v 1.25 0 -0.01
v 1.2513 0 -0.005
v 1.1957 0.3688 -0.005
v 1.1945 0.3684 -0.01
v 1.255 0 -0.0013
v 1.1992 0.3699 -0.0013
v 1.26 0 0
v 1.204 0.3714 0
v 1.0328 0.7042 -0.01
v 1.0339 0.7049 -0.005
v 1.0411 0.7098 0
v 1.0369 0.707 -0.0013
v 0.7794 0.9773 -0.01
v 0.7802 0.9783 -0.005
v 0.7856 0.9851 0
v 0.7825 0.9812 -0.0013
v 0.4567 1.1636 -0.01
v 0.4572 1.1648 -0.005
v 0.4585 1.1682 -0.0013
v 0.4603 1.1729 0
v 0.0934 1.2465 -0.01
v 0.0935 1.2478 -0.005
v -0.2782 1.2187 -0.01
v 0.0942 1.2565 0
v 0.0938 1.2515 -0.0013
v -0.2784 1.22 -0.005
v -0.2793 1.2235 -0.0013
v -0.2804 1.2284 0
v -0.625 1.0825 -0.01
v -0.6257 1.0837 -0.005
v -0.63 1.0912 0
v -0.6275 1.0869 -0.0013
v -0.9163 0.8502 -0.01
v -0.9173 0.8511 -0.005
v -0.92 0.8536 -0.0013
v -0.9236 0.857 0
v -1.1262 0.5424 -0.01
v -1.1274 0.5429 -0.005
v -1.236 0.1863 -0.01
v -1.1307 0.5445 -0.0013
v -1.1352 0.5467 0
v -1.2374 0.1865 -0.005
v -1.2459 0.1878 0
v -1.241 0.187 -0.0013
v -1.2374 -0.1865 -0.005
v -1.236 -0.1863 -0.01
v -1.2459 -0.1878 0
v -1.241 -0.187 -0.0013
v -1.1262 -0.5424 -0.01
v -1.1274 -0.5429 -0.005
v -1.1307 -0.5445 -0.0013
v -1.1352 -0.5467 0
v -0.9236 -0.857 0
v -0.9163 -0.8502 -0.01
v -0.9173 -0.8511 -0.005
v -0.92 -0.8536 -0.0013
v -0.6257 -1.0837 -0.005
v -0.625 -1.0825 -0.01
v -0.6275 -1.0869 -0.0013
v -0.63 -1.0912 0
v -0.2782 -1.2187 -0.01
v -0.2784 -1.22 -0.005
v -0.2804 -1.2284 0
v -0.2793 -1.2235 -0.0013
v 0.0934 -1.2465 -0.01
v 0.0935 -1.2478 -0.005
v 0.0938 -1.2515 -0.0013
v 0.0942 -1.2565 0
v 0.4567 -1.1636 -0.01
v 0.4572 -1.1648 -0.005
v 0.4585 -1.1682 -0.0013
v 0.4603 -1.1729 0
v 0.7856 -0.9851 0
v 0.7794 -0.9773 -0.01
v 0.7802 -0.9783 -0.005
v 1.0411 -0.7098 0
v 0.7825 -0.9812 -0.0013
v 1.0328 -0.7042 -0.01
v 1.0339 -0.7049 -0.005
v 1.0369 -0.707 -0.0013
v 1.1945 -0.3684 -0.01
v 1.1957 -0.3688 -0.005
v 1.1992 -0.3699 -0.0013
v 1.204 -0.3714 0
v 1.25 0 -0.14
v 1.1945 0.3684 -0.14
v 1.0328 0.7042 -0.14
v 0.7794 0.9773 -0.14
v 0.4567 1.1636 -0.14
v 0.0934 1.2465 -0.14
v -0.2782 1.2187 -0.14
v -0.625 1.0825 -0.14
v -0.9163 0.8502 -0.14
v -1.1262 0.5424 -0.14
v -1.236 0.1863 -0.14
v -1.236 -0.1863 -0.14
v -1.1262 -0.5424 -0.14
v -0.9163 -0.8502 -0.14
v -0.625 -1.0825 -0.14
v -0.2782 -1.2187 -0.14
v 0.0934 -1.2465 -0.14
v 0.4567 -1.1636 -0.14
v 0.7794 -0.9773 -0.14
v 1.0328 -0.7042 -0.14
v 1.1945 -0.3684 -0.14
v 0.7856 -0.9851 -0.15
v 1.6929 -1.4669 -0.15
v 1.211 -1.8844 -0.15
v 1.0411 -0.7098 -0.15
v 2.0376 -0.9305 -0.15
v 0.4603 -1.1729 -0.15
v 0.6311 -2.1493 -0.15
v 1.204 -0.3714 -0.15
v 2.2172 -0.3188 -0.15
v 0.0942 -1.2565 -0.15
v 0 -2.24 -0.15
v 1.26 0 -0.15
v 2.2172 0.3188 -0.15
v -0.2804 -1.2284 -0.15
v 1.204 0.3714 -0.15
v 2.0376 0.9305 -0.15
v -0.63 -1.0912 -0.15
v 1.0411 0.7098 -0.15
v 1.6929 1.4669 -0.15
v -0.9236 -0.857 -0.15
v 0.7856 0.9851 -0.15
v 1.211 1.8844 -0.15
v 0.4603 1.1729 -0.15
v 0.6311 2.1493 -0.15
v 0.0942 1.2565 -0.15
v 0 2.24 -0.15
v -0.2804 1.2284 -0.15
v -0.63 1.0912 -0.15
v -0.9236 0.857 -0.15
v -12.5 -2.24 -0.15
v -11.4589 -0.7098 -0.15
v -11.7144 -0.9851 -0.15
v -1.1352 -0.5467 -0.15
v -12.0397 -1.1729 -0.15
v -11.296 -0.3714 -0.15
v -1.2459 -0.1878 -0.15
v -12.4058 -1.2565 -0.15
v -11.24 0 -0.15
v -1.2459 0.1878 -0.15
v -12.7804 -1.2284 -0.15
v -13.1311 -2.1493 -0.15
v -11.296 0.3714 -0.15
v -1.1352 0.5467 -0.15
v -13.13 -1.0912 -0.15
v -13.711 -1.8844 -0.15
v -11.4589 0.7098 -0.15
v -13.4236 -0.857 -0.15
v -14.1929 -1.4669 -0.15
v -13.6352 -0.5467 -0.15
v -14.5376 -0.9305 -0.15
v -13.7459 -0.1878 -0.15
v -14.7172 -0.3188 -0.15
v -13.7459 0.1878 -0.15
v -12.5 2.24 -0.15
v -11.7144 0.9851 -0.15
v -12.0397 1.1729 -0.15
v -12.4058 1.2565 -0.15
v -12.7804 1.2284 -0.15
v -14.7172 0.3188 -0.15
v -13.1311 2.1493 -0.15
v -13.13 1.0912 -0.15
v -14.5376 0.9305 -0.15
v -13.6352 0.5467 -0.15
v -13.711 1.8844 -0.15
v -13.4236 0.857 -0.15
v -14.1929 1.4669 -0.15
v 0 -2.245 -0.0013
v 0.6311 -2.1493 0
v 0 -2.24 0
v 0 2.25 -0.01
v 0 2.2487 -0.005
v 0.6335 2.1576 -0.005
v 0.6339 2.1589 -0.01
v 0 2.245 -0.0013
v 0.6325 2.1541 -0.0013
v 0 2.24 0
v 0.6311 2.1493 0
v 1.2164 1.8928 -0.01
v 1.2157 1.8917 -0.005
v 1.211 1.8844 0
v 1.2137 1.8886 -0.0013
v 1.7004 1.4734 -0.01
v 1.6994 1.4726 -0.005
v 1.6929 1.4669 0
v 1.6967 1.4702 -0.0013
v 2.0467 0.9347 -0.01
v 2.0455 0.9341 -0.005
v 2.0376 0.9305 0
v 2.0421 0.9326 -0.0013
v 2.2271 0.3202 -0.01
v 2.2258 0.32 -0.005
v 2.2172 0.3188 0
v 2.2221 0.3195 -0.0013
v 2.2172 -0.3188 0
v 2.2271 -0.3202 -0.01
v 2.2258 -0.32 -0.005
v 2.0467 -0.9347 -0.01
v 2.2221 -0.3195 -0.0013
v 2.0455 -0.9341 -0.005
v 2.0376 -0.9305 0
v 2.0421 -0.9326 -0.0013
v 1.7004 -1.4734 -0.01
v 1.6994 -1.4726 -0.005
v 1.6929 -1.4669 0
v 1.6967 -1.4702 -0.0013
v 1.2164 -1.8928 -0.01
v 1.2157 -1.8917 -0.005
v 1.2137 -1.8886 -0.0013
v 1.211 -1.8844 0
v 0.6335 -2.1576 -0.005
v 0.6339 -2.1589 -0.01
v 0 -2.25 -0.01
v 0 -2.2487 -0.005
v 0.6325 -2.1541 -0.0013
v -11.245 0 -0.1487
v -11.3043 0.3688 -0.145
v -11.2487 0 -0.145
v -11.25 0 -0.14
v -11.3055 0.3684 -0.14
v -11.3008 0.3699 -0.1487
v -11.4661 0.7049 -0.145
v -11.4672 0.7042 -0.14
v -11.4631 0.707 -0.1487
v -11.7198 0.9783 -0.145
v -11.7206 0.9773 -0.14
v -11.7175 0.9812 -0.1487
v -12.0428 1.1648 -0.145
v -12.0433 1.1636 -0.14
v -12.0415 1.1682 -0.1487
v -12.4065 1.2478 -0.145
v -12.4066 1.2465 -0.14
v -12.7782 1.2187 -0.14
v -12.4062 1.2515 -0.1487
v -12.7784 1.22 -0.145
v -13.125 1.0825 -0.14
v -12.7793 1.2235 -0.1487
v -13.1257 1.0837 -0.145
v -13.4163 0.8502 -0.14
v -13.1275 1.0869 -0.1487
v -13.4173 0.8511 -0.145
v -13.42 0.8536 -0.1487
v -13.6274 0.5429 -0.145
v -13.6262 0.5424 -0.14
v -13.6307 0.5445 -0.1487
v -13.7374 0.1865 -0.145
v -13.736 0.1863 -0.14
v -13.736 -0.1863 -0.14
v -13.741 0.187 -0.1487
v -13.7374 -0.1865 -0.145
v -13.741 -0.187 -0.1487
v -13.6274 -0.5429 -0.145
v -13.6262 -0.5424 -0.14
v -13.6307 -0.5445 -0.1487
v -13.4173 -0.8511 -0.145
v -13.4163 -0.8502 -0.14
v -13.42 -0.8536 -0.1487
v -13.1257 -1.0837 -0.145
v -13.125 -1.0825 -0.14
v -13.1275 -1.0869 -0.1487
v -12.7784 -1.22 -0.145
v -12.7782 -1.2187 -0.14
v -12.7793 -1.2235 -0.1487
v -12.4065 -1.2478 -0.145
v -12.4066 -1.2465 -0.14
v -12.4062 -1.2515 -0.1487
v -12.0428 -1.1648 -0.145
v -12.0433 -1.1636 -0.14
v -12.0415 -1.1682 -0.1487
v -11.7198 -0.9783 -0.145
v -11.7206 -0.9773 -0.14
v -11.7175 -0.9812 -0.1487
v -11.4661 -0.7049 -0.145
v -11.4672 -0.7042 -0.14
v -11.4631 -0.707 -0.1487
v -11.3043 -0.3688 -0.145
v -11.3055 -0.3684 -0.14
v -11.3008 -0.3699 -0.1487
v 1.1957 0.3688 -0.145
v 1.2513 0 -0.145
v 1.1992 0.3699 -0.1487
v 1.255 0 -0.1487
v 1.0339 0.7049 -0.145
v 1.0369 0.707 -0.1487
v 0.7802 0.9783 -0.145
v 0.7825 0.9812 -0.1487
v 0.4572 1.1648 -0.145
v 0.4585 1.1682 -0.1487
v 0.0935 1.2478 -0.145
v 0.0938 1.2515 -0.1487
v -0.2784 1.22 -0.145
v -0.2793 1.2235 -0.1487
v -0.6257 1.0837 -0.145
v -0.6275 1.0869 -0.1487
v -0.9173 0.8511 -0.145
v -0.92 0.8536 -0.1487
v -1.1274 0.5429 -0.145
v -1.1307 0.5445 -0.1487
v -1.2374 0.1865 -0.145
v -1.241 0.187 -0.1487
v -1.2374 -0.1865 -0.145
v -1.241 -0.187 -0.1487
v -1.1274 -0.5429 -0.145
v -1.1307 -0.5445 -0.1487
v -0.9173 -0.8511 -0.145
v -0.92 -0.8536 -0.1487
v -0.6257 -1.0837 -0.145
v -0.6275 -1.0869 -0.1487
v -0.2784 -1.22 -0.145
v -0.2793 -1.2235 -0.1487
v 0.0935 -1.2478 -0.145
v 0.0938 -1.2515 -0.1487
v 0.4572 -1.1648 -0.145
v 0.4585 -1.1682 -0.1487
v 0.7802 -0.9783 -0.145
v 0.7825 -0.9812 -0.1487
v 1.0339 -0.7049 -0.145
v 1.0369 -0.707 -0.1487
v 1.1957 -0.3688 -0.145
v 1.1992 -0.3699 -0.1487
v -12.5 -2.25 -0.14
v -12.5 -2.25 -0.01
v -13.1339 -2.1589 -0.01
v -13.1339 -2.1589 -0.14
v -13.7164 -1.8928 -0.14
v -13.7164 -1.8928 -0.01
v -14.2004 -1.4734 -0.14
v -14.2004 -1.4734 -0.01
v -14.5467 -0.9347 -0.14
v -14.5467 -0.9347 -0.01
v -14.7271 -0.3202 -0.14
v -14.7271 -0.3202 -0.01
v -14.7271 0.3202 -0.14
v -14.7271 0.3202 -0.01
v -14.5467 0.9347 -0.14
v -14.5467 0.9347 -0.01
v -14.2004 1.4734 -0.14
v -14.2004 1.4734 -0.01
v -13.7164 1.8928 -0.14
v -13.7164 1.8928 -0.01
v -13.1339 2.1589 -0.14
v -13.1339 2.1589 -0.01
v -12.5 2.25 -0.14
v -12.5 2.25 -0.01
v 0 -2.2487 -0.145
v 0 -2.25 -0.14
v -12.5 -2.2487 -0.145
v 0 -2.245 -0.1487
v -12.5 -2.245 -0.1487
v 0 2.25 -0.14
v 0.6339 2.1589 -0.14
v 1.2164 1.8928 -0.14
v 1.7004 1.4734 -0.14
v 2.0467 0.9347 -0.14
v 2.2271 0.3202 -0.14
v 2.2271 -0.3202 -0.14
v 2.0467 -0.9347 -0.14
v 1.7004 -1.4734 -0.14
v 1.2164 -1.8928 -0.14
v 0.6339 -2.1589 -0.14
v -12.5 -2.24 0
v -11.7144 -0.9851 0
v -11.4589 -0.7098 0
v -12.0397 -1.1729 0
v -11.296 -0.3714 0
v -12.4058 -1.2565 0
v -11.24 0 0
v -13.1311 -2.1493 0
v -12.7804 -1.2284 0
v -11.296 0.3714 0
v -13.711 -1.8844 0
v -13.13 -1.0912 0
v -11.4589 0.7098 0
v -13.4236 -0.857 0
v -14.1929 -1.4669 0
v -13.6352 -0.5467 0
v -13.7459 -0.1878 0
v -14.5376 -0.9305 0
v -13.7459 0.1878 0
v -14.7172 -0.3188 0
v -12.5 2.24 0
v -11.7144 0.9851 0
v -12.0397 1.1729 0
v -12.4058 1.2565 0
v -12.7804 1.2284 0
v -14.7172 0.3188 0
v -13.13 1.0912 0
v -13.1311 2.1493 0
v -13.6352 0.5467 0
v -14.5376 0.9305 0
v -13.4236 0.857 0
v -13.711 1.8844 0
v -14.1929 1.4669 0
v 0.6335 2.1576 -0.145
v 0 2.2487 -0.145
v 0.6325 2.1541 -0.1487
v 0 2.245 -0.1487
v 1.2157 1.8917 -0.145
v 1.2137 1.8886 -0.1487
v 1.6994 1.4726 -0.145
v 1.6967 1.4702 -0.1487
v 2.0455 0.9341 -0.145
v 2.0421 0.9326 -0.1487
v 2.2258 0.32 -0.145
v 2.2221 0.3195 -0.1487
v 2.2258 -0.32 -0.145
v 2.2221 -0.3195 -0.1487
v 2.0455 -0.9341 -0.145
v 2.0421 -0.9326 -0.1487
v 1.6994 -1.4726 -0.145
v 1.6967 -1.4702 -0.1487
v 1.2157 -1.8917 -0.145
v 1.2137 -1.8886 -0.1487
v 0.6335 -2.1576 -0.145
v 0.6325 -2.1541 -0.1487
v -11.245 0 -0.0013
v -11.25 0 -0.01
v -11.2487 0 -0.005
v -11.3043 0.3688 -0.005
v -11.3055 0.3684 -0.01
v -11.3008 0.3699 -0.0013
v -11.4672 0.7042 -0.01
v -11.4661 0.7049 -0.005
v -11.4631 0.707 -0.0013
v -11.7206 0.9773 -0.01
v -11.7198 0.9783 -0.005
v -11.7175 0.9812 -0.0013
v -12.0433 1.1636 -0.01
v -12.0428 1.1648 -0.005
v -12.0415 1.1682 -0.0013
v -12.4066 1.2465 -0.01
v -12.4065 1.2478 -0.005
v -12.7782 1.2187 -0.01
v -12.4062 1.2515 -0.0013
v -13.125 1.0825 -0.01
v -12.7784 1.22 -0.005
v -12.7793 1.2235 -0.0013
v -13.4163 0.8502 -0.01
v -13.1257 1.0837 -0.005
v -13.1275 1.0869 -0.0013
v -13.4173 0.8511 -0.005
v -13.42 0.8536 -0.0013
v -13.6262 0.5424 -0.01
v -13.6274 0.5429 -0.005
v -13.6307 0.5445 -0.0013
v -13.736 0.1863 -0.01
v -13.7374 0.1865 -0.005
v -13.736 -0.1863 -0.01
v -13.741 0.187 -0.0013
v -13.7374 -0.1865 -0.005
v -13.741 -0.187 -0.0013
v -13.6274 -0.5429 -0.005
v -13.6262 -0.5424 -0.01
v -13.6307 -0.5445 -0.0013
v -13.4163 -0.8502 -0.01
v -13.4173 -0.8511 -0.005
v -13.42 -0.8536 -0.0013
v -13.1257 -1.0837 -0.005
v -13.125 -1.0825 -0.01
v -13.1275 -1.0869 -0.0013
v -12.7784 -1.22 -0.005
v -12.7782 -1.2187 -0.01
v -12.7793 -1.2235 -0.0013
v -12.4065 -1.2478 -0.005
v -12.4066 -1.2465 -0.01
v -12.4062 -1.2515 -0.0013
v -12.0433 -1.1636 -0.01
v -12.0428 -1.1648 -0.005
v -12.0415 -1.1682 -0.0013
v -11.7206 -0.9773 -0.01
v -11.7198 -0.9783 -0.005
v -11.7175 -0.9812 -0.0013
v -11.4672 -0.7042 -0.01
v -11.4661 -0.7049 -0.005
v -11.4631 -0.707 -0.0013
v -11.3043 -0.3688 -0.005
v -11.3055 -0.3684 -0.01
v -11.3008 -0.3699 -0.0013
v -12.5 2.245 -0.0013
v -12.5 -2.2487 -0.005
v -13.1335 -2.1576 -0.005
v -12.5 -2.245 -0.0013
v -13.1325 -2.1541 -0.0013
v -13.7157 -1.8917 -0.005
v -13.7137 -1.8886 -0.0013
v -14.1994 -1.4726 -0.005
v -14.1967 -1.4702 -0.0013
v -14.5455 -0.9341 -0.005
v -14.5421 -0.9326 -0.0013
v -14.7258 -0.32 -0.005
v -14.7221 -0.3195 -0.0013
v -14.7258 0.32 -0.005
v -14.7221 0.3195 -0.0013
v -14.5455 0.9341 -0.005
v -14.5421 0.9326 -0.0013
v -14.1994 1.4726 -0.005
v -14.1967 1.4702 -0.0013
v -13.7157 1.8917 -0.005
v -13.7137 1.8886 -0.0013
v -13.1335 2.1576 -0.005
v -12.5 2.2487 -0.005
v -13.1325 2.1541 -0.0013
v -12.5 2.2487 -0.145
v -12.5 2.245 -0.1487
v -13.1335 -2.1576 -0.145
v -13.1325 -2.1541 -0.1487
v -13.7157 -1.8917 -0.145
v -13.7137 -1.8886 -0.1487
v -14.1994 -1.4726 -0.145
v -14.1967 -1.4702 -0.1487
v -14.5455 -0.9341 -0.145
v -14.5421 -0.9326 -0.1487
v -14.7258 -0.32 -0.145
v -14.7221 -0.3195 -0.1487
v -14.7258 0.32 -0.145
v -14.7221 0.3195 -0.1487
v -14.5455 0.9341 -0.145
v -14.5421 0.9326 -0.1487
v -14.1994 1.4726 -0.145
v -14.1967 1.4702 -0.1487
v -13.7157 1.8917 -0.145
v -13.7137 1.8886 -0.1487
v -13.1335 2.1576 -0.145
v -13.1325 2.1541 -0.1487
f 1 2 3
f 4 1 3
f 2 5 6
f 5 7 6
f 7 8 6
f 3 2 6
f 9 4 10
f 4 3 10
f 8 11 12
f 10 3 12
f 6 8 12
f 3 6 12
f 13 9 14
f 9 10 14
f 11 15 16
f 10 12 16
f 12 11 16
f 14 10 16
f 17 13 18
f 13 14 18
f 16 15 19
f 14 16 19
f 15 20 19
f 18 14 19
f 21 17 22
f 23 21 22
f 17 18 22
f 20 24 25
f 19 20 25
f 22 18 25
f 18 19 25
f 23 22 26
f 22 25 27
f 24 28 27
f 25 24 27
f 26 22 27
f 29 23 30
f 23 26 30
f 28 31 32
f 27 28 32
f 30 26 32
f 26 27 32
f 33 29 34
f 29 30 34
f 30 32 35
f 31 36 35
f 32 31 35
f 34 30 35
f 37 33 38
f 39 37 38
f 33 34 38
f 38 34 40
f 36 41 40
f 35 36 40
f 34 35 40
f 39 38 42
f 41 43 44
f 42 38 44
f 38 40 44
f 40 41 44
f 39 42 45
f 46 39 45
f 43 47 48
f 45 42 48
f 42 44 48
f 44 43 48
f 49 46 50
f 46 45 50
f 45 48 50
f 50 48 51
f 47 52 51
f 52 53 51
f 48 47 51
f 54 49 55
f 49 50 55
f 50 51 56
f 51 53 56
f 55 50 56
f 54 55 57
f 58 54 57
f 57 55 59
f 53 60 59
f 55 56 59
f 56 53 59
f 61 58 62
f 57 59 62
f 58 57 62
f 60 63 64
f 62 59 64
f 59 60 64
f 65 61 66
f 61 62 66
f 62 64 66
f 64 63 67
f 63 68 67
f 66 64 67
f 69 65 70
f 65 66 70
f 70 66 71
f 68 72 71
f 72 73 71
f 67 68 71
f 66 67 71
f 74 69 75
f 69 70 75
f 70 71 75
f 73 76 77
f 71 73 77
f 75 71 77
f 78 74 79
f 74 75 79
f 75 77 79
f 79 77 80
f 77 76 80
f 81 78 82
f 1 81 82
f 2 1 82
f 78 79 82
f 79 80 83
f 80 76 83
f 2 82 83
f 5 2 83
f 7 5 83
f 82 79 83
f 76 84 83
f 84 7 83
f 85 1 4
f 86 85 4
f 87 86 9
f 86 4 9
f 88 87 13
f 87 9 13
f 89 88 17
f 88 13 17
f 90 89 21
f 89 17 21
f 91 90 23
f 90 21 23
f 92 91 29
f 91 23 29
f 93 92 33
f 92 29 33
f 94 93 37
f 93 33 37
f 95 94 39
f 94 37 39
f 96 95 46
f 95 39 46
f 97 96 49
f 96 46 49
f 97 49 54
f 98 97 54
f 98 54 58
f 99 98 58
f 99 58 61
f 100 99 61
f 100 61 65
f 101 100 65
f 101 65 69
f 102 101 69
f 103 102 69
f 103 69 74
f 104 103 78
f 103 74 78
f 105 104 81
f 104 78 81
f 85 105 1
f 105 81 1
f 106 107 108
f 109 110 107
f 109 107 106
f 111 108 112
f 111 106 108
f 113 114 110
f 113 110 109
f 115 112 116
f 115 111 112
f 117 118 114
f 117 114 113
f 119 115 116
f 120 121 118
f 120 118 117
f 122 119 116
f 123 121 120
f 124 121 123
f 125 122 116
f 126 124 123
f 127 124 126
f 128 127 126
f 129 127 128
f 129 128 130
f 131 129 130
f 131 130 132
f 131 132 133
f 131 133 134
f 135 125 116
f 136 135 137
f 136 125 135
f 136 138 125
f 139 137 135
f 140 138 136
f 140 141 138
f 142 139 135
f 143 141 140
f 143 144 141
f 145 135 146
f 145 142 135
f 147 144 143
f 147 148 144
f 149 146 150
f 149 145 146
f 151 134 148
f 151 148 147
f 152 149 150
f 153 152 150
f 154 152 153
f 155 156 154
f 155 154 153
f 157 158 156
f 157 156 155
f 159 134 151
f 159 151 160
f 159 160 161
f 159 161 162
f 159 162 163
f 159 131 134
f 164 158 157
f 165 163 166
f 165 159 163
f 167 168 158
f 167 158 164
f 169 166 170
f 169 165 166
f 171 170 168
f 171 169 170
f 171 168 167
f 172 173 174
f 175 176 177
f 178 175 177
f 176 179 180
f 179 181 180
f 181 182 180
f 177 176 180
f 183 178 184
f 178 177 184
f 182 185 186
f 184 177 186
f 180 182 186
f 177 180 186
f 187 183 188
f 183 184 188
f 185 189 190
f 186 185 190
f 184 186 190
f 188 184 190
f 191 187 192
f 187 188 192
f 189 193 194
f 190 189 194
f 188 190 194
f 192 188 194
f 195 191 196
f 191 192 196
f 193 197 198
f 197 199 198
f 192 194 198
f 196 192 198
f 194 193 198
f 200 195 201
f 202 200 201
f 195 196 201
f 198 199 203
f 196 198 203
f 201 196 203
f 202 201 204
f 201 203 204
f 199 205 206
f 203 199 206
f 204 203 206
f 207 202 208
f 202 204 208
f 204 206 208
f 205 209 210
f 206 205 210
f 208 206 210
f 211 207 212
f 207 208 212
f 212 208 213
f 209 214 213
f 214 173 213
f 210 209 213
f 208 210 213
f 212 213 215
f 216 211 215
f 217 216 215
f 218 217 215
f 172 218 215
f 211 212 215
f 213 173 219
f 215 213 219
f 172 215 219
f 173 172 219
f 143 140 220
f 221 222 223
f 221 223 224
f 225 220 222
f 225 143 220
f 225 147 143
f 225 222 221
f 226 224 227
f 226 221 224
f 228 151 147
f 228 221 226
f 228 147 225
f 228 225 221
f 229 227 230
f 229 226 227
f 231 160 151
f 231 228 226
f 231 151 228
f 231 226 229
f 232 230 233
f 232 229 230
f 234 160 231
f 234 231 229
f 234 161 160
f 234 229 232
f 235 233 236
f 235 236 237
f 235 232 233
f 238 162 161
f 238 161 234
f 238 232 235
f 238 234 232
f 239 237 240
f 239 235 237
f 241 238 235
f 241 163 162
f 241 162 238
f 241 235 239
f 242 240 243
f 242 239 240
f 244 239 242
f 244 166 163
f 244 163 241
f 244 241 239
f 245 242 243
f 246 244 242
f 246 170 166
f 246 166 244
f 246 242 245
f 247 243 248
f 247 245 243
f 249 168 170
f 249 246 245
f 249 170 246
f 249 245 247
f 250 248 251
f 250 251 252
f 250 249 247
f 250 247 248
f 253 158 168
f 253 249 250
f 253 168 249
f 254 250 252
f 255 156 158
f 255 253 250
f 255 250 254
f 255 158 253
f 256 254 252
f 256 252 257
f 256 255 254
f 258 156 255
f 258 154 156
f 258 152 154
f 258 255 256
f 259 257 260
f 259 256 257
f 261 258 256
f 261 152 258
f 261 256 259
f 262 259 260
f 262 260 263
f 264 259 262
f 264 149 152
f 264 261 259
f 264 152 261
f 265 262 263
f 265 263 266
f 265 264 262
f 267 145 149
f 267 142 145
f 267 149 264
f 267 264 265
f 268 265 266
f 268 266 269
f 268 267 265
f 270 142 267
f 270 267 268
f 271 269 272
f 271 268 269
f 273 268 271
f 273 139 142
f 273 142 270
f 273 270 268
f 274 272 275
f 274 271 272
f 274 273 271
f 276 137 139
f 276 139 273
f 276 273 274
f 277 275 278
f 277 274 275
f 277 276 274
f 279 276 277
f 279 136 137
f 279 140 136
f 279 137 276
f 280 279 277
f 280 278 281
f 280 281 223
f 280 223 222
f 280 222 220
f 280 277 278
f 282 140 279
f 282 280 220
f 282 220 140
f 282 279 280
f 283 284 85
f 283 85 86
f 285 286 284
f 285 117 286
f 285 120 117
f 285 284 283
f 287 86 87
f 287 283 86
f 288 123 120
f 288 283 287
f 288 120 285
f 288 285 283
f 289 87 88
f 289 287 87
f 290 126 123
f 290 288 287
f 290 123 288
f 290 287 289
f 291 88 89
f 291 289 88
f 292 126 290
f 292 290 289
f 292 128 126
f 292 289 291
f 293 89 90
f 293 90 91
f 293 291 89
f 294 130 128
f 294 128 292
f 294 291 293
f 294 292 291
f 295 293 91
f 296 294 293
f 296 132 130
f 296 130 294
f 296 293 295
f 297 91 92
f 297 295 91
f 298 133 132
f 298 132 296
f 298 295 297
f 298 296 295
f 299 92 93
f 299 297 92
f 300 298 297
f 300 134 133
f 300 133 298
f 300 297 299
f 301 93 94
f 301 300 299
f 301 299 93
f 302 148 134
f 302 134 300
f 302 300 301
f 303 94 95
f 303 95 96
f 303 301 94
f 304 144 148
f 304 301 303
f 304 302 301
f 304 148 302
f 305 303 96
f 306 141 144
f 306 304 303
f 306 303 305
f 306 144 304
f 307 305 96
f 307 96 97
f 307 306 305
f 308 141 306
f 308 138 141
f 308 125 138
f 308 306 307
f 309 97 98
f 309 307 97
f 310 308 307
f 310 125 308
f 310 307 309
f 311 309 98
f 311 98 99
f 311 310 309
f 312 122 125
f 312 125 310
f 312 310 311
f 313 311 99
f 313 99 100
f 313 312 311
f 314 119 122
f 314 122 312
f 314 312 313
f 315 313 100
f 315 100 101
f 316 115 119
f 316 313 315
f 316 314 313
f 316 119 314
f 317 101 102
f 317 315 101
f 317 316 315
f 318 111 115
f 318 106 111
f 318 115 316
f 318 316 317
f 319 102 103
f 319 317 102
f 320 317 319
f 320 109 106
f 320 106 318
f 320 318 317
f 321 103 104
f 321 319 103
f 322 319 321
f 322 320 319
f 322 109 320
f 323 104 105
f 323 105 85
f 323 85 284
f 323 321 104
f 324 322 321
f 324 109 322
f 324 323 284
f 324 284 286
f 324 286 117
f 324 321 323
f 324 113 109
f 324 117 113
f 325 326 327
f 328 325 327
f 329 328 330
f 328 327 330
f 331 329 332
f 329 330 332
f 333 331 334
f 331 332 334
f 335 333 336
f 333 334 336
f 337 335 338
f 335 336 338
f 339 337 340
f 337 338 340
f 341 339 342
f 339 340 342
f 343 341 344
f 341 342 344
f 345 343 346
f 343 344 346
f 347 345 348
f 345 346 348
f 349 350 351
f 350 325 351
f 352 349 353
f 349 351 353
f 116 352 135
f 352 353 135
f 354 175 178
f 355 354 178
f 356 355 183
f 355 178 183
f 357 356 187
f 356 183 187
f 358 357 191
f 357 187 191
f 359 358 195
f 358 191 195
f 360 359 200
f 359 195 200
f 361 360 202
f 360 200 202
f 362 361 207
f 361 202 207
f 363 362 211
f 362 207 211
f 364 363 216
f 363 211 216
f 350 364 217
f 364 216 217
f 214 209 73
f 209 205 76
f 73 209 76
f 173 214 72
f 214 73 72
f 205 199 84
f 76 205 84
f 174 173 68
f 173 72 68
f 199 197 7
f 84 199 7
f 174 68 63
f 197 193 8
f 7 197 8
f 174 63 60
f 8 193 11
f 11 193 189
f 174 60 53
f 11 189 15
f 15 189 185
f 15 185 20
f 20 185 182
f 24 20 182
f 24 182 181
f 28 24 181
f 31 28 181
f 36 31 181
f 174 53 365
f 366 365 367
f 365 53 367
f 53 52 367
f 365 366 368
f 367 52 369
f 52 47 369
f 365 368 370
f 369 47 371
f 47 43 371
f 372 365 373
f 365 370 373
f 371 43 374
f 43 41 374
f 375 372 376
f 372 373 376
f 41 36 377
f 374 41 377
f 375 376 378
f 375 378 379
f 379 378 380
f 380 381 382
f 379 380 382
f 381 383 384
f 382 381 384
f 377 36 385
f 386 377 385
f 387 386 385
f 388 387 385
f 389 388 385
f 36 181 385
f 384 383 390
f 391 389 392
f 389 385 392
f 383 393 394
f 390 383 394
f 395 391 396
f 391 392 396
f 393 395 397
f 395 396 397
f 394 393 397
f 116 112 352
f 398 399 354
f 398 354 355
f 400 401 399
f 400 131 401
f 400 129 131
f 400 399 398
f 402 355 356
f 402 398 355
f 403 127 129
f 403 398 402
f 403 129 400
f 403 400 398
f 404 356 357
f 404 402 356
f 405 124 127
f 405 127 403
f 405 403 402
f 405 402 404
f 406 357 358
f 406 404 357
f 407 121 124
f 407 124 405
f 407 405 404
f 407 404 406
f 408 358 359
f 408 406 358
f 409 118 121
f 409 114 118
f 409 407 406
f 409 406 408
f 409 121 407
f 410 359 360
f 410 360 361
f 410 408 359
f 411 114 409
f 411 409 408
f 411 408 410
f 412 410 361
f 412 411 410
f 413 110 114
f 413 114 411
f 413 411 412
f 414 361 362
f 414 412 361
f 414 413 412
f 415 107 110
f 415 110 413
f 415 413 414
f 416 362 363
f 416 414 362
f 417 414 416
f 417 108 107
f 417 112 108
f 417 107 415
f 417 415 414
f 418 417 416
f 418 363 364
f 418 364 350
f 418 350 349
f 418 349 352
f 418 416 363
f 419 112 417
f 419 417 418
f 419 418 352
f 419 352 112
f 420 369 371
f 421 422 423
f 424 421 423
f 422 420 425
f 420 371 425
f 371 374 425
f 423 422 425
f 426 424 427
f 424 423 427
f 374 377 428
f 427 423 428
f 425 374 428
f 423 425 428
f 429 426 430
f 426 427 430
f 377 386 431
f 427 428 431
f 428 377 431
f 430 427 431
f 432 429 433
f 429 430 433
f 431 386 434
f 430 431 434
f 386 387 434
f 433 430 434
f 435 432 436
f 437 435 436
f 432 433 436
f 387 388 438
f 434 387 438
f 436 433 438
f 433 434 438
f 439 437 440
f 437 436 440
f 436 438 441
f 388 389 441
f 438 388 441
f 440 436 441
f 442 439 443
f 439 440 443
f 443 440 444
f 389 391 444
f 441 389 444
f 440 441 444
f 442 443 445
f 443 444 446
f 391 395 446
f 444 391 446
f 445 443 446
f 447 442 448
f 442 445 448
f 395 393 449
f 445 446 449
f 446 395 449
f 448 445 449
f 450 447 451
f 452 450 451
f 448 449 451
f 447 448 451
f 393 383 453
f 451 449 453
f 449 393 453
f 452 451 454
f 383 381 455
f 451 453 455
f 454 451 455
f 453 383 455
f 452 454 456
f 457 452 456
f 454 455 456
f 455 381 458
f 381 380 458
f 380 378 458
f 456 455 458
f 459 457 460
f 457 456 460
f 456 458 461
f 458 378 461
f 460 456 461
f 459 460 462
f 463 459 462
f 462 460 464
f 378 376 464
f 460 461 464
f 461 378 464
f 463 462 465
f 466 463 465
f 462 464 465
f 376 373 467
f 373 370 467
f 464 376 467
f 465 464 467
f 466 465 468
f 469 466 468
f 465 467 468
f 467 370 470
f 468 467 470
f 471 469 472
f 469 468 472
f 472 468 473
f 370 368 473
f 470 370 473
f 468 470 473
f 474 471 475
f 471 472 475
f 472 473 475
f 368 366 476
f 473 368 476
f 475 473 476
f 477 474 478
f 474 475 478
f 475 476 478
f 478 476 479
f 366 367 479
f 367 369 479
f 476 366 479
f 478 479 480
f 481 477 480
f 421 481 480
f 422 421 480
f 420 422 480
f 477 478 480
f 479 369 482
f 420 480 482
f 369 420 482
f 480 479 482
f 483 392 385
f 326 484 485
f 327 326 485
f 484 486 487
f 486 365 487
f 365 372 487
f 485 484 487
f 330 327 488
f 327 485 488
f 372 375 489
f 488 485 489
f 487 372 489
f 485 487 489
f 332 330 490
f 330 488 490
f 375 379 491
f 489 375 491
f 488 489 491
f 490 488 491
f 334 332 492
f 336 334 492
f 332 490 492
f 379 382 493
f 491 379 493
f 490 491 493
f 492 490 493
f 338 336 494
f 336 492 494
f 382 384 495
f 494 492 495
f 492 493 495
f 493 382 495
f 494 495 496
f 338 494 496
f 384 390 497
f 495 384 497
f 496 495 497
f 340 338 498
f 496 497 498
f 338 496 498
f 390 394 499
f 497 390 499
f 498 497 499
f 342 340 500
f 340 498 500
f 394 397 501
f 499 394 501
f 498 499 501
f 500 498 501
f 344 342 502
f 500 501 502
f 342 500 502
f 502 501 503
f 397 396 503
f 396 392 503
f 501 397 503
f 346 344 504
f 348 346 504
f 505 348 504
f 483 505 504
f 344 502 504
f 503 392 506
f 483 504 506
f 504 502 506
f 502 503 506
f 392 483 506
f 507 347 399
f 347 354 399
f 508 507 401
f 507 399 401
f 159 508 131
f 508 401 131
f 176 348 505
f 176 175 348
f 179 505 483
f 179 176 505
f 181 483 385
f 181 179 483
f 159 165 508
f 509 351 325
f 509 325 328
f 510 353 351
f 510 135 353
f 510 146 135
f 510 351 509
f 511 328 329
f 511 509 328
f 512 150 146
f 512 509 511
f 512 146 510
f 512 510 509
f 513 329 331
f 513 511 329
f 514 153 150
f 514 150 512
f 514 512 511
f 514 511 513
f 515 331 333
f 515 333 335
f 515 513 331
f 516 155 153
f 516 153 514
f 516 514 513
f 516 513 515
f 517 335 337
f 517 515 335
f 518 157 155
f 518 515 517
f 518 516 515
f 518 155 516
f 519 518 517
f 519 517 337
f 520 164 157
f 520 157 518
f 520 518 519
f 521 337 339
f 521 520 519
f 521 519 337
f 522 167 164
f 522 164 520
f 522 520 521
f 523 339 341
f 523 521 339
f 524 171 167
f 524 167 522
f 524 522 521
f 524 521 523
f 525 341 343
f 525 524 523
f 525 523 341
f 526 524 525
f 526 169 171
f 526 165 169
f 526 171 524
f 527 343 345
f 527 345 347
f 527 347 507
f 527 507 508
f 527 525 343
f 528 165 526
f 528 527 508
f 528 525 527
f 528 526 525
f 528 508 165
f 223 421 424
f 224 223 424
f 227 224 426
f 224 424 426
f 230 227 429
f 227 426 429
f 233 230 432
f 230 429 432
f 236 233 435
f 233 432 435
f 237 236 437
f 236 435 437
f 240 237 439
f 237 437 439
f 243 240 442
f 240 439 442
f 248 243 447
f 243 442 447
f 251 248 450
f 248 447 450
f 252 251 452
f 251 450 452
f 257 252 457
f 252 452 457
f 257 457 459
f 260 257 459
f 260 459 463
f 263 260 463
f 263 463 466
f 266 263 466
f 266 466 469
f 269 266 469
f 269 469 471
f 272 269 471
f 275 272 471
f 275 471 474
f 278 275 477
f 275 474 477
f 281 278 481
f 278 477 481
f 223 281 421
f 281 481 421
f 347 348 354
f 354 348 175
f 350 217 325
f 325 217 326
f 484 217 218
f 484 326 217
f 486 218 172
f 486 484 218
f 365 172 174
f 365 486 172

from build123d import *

# Parameters (mm, degrees)
SKETCH1_R          = 1.25
BASE_FLANGE1_DEPTH = 0.15
FILLET1_R          = 0.01


# Sheet-metal steps are written as plain solids
with BuildPart() as part:
    # Sketch1 → Base-Flange1 (new body)
    with BuildSketch(Plane.XY):
        with BuildLine():
            Line((0, -2.25), (-12.5, -2.25))
            ThreePointArc((-12.5, -2.25), (-14.75, 0), (-12.5, 2.25))
            Line((-12.5, 2.25), (0, 2.25))
            ThreePointArc((0, 2.25), (2.25, 0), (0, -2.25))
        make_face()
        with Locations((-12.5, 0)):
            Circle(SKETCH1_R, mode=Mode.SUBTRACT)
        Circle(SKETCH1_R, mode=Mode.SUBTRACT)
    extrude(amount=-BASE_FLANGE1_DEPTH)

    # Fillet1
    fillet1_edges = [part.edges().sort_by_distance(p)[0] for p in [
        (-14.75, 0, -0.15),
        (-13.75, 0, -0.15),
        (-13.75, 0, 0),
        (-6.25, -2.25, -0.15),
        (-1.25, 0, -0.15),
        (-1.25, 0, 0),
        (2.25, 0, -0.15),
        (-6.25, -2.25, 0),
        (-14.75, 0, 0),
        (-6.25, 2.25, 0),
        (2.25, 0, 0),
        (-6.25, 2.25, -0.15),
    ]]
    fillet(fillet1_edges, radius=FILLET1_R)


solid = part.part
